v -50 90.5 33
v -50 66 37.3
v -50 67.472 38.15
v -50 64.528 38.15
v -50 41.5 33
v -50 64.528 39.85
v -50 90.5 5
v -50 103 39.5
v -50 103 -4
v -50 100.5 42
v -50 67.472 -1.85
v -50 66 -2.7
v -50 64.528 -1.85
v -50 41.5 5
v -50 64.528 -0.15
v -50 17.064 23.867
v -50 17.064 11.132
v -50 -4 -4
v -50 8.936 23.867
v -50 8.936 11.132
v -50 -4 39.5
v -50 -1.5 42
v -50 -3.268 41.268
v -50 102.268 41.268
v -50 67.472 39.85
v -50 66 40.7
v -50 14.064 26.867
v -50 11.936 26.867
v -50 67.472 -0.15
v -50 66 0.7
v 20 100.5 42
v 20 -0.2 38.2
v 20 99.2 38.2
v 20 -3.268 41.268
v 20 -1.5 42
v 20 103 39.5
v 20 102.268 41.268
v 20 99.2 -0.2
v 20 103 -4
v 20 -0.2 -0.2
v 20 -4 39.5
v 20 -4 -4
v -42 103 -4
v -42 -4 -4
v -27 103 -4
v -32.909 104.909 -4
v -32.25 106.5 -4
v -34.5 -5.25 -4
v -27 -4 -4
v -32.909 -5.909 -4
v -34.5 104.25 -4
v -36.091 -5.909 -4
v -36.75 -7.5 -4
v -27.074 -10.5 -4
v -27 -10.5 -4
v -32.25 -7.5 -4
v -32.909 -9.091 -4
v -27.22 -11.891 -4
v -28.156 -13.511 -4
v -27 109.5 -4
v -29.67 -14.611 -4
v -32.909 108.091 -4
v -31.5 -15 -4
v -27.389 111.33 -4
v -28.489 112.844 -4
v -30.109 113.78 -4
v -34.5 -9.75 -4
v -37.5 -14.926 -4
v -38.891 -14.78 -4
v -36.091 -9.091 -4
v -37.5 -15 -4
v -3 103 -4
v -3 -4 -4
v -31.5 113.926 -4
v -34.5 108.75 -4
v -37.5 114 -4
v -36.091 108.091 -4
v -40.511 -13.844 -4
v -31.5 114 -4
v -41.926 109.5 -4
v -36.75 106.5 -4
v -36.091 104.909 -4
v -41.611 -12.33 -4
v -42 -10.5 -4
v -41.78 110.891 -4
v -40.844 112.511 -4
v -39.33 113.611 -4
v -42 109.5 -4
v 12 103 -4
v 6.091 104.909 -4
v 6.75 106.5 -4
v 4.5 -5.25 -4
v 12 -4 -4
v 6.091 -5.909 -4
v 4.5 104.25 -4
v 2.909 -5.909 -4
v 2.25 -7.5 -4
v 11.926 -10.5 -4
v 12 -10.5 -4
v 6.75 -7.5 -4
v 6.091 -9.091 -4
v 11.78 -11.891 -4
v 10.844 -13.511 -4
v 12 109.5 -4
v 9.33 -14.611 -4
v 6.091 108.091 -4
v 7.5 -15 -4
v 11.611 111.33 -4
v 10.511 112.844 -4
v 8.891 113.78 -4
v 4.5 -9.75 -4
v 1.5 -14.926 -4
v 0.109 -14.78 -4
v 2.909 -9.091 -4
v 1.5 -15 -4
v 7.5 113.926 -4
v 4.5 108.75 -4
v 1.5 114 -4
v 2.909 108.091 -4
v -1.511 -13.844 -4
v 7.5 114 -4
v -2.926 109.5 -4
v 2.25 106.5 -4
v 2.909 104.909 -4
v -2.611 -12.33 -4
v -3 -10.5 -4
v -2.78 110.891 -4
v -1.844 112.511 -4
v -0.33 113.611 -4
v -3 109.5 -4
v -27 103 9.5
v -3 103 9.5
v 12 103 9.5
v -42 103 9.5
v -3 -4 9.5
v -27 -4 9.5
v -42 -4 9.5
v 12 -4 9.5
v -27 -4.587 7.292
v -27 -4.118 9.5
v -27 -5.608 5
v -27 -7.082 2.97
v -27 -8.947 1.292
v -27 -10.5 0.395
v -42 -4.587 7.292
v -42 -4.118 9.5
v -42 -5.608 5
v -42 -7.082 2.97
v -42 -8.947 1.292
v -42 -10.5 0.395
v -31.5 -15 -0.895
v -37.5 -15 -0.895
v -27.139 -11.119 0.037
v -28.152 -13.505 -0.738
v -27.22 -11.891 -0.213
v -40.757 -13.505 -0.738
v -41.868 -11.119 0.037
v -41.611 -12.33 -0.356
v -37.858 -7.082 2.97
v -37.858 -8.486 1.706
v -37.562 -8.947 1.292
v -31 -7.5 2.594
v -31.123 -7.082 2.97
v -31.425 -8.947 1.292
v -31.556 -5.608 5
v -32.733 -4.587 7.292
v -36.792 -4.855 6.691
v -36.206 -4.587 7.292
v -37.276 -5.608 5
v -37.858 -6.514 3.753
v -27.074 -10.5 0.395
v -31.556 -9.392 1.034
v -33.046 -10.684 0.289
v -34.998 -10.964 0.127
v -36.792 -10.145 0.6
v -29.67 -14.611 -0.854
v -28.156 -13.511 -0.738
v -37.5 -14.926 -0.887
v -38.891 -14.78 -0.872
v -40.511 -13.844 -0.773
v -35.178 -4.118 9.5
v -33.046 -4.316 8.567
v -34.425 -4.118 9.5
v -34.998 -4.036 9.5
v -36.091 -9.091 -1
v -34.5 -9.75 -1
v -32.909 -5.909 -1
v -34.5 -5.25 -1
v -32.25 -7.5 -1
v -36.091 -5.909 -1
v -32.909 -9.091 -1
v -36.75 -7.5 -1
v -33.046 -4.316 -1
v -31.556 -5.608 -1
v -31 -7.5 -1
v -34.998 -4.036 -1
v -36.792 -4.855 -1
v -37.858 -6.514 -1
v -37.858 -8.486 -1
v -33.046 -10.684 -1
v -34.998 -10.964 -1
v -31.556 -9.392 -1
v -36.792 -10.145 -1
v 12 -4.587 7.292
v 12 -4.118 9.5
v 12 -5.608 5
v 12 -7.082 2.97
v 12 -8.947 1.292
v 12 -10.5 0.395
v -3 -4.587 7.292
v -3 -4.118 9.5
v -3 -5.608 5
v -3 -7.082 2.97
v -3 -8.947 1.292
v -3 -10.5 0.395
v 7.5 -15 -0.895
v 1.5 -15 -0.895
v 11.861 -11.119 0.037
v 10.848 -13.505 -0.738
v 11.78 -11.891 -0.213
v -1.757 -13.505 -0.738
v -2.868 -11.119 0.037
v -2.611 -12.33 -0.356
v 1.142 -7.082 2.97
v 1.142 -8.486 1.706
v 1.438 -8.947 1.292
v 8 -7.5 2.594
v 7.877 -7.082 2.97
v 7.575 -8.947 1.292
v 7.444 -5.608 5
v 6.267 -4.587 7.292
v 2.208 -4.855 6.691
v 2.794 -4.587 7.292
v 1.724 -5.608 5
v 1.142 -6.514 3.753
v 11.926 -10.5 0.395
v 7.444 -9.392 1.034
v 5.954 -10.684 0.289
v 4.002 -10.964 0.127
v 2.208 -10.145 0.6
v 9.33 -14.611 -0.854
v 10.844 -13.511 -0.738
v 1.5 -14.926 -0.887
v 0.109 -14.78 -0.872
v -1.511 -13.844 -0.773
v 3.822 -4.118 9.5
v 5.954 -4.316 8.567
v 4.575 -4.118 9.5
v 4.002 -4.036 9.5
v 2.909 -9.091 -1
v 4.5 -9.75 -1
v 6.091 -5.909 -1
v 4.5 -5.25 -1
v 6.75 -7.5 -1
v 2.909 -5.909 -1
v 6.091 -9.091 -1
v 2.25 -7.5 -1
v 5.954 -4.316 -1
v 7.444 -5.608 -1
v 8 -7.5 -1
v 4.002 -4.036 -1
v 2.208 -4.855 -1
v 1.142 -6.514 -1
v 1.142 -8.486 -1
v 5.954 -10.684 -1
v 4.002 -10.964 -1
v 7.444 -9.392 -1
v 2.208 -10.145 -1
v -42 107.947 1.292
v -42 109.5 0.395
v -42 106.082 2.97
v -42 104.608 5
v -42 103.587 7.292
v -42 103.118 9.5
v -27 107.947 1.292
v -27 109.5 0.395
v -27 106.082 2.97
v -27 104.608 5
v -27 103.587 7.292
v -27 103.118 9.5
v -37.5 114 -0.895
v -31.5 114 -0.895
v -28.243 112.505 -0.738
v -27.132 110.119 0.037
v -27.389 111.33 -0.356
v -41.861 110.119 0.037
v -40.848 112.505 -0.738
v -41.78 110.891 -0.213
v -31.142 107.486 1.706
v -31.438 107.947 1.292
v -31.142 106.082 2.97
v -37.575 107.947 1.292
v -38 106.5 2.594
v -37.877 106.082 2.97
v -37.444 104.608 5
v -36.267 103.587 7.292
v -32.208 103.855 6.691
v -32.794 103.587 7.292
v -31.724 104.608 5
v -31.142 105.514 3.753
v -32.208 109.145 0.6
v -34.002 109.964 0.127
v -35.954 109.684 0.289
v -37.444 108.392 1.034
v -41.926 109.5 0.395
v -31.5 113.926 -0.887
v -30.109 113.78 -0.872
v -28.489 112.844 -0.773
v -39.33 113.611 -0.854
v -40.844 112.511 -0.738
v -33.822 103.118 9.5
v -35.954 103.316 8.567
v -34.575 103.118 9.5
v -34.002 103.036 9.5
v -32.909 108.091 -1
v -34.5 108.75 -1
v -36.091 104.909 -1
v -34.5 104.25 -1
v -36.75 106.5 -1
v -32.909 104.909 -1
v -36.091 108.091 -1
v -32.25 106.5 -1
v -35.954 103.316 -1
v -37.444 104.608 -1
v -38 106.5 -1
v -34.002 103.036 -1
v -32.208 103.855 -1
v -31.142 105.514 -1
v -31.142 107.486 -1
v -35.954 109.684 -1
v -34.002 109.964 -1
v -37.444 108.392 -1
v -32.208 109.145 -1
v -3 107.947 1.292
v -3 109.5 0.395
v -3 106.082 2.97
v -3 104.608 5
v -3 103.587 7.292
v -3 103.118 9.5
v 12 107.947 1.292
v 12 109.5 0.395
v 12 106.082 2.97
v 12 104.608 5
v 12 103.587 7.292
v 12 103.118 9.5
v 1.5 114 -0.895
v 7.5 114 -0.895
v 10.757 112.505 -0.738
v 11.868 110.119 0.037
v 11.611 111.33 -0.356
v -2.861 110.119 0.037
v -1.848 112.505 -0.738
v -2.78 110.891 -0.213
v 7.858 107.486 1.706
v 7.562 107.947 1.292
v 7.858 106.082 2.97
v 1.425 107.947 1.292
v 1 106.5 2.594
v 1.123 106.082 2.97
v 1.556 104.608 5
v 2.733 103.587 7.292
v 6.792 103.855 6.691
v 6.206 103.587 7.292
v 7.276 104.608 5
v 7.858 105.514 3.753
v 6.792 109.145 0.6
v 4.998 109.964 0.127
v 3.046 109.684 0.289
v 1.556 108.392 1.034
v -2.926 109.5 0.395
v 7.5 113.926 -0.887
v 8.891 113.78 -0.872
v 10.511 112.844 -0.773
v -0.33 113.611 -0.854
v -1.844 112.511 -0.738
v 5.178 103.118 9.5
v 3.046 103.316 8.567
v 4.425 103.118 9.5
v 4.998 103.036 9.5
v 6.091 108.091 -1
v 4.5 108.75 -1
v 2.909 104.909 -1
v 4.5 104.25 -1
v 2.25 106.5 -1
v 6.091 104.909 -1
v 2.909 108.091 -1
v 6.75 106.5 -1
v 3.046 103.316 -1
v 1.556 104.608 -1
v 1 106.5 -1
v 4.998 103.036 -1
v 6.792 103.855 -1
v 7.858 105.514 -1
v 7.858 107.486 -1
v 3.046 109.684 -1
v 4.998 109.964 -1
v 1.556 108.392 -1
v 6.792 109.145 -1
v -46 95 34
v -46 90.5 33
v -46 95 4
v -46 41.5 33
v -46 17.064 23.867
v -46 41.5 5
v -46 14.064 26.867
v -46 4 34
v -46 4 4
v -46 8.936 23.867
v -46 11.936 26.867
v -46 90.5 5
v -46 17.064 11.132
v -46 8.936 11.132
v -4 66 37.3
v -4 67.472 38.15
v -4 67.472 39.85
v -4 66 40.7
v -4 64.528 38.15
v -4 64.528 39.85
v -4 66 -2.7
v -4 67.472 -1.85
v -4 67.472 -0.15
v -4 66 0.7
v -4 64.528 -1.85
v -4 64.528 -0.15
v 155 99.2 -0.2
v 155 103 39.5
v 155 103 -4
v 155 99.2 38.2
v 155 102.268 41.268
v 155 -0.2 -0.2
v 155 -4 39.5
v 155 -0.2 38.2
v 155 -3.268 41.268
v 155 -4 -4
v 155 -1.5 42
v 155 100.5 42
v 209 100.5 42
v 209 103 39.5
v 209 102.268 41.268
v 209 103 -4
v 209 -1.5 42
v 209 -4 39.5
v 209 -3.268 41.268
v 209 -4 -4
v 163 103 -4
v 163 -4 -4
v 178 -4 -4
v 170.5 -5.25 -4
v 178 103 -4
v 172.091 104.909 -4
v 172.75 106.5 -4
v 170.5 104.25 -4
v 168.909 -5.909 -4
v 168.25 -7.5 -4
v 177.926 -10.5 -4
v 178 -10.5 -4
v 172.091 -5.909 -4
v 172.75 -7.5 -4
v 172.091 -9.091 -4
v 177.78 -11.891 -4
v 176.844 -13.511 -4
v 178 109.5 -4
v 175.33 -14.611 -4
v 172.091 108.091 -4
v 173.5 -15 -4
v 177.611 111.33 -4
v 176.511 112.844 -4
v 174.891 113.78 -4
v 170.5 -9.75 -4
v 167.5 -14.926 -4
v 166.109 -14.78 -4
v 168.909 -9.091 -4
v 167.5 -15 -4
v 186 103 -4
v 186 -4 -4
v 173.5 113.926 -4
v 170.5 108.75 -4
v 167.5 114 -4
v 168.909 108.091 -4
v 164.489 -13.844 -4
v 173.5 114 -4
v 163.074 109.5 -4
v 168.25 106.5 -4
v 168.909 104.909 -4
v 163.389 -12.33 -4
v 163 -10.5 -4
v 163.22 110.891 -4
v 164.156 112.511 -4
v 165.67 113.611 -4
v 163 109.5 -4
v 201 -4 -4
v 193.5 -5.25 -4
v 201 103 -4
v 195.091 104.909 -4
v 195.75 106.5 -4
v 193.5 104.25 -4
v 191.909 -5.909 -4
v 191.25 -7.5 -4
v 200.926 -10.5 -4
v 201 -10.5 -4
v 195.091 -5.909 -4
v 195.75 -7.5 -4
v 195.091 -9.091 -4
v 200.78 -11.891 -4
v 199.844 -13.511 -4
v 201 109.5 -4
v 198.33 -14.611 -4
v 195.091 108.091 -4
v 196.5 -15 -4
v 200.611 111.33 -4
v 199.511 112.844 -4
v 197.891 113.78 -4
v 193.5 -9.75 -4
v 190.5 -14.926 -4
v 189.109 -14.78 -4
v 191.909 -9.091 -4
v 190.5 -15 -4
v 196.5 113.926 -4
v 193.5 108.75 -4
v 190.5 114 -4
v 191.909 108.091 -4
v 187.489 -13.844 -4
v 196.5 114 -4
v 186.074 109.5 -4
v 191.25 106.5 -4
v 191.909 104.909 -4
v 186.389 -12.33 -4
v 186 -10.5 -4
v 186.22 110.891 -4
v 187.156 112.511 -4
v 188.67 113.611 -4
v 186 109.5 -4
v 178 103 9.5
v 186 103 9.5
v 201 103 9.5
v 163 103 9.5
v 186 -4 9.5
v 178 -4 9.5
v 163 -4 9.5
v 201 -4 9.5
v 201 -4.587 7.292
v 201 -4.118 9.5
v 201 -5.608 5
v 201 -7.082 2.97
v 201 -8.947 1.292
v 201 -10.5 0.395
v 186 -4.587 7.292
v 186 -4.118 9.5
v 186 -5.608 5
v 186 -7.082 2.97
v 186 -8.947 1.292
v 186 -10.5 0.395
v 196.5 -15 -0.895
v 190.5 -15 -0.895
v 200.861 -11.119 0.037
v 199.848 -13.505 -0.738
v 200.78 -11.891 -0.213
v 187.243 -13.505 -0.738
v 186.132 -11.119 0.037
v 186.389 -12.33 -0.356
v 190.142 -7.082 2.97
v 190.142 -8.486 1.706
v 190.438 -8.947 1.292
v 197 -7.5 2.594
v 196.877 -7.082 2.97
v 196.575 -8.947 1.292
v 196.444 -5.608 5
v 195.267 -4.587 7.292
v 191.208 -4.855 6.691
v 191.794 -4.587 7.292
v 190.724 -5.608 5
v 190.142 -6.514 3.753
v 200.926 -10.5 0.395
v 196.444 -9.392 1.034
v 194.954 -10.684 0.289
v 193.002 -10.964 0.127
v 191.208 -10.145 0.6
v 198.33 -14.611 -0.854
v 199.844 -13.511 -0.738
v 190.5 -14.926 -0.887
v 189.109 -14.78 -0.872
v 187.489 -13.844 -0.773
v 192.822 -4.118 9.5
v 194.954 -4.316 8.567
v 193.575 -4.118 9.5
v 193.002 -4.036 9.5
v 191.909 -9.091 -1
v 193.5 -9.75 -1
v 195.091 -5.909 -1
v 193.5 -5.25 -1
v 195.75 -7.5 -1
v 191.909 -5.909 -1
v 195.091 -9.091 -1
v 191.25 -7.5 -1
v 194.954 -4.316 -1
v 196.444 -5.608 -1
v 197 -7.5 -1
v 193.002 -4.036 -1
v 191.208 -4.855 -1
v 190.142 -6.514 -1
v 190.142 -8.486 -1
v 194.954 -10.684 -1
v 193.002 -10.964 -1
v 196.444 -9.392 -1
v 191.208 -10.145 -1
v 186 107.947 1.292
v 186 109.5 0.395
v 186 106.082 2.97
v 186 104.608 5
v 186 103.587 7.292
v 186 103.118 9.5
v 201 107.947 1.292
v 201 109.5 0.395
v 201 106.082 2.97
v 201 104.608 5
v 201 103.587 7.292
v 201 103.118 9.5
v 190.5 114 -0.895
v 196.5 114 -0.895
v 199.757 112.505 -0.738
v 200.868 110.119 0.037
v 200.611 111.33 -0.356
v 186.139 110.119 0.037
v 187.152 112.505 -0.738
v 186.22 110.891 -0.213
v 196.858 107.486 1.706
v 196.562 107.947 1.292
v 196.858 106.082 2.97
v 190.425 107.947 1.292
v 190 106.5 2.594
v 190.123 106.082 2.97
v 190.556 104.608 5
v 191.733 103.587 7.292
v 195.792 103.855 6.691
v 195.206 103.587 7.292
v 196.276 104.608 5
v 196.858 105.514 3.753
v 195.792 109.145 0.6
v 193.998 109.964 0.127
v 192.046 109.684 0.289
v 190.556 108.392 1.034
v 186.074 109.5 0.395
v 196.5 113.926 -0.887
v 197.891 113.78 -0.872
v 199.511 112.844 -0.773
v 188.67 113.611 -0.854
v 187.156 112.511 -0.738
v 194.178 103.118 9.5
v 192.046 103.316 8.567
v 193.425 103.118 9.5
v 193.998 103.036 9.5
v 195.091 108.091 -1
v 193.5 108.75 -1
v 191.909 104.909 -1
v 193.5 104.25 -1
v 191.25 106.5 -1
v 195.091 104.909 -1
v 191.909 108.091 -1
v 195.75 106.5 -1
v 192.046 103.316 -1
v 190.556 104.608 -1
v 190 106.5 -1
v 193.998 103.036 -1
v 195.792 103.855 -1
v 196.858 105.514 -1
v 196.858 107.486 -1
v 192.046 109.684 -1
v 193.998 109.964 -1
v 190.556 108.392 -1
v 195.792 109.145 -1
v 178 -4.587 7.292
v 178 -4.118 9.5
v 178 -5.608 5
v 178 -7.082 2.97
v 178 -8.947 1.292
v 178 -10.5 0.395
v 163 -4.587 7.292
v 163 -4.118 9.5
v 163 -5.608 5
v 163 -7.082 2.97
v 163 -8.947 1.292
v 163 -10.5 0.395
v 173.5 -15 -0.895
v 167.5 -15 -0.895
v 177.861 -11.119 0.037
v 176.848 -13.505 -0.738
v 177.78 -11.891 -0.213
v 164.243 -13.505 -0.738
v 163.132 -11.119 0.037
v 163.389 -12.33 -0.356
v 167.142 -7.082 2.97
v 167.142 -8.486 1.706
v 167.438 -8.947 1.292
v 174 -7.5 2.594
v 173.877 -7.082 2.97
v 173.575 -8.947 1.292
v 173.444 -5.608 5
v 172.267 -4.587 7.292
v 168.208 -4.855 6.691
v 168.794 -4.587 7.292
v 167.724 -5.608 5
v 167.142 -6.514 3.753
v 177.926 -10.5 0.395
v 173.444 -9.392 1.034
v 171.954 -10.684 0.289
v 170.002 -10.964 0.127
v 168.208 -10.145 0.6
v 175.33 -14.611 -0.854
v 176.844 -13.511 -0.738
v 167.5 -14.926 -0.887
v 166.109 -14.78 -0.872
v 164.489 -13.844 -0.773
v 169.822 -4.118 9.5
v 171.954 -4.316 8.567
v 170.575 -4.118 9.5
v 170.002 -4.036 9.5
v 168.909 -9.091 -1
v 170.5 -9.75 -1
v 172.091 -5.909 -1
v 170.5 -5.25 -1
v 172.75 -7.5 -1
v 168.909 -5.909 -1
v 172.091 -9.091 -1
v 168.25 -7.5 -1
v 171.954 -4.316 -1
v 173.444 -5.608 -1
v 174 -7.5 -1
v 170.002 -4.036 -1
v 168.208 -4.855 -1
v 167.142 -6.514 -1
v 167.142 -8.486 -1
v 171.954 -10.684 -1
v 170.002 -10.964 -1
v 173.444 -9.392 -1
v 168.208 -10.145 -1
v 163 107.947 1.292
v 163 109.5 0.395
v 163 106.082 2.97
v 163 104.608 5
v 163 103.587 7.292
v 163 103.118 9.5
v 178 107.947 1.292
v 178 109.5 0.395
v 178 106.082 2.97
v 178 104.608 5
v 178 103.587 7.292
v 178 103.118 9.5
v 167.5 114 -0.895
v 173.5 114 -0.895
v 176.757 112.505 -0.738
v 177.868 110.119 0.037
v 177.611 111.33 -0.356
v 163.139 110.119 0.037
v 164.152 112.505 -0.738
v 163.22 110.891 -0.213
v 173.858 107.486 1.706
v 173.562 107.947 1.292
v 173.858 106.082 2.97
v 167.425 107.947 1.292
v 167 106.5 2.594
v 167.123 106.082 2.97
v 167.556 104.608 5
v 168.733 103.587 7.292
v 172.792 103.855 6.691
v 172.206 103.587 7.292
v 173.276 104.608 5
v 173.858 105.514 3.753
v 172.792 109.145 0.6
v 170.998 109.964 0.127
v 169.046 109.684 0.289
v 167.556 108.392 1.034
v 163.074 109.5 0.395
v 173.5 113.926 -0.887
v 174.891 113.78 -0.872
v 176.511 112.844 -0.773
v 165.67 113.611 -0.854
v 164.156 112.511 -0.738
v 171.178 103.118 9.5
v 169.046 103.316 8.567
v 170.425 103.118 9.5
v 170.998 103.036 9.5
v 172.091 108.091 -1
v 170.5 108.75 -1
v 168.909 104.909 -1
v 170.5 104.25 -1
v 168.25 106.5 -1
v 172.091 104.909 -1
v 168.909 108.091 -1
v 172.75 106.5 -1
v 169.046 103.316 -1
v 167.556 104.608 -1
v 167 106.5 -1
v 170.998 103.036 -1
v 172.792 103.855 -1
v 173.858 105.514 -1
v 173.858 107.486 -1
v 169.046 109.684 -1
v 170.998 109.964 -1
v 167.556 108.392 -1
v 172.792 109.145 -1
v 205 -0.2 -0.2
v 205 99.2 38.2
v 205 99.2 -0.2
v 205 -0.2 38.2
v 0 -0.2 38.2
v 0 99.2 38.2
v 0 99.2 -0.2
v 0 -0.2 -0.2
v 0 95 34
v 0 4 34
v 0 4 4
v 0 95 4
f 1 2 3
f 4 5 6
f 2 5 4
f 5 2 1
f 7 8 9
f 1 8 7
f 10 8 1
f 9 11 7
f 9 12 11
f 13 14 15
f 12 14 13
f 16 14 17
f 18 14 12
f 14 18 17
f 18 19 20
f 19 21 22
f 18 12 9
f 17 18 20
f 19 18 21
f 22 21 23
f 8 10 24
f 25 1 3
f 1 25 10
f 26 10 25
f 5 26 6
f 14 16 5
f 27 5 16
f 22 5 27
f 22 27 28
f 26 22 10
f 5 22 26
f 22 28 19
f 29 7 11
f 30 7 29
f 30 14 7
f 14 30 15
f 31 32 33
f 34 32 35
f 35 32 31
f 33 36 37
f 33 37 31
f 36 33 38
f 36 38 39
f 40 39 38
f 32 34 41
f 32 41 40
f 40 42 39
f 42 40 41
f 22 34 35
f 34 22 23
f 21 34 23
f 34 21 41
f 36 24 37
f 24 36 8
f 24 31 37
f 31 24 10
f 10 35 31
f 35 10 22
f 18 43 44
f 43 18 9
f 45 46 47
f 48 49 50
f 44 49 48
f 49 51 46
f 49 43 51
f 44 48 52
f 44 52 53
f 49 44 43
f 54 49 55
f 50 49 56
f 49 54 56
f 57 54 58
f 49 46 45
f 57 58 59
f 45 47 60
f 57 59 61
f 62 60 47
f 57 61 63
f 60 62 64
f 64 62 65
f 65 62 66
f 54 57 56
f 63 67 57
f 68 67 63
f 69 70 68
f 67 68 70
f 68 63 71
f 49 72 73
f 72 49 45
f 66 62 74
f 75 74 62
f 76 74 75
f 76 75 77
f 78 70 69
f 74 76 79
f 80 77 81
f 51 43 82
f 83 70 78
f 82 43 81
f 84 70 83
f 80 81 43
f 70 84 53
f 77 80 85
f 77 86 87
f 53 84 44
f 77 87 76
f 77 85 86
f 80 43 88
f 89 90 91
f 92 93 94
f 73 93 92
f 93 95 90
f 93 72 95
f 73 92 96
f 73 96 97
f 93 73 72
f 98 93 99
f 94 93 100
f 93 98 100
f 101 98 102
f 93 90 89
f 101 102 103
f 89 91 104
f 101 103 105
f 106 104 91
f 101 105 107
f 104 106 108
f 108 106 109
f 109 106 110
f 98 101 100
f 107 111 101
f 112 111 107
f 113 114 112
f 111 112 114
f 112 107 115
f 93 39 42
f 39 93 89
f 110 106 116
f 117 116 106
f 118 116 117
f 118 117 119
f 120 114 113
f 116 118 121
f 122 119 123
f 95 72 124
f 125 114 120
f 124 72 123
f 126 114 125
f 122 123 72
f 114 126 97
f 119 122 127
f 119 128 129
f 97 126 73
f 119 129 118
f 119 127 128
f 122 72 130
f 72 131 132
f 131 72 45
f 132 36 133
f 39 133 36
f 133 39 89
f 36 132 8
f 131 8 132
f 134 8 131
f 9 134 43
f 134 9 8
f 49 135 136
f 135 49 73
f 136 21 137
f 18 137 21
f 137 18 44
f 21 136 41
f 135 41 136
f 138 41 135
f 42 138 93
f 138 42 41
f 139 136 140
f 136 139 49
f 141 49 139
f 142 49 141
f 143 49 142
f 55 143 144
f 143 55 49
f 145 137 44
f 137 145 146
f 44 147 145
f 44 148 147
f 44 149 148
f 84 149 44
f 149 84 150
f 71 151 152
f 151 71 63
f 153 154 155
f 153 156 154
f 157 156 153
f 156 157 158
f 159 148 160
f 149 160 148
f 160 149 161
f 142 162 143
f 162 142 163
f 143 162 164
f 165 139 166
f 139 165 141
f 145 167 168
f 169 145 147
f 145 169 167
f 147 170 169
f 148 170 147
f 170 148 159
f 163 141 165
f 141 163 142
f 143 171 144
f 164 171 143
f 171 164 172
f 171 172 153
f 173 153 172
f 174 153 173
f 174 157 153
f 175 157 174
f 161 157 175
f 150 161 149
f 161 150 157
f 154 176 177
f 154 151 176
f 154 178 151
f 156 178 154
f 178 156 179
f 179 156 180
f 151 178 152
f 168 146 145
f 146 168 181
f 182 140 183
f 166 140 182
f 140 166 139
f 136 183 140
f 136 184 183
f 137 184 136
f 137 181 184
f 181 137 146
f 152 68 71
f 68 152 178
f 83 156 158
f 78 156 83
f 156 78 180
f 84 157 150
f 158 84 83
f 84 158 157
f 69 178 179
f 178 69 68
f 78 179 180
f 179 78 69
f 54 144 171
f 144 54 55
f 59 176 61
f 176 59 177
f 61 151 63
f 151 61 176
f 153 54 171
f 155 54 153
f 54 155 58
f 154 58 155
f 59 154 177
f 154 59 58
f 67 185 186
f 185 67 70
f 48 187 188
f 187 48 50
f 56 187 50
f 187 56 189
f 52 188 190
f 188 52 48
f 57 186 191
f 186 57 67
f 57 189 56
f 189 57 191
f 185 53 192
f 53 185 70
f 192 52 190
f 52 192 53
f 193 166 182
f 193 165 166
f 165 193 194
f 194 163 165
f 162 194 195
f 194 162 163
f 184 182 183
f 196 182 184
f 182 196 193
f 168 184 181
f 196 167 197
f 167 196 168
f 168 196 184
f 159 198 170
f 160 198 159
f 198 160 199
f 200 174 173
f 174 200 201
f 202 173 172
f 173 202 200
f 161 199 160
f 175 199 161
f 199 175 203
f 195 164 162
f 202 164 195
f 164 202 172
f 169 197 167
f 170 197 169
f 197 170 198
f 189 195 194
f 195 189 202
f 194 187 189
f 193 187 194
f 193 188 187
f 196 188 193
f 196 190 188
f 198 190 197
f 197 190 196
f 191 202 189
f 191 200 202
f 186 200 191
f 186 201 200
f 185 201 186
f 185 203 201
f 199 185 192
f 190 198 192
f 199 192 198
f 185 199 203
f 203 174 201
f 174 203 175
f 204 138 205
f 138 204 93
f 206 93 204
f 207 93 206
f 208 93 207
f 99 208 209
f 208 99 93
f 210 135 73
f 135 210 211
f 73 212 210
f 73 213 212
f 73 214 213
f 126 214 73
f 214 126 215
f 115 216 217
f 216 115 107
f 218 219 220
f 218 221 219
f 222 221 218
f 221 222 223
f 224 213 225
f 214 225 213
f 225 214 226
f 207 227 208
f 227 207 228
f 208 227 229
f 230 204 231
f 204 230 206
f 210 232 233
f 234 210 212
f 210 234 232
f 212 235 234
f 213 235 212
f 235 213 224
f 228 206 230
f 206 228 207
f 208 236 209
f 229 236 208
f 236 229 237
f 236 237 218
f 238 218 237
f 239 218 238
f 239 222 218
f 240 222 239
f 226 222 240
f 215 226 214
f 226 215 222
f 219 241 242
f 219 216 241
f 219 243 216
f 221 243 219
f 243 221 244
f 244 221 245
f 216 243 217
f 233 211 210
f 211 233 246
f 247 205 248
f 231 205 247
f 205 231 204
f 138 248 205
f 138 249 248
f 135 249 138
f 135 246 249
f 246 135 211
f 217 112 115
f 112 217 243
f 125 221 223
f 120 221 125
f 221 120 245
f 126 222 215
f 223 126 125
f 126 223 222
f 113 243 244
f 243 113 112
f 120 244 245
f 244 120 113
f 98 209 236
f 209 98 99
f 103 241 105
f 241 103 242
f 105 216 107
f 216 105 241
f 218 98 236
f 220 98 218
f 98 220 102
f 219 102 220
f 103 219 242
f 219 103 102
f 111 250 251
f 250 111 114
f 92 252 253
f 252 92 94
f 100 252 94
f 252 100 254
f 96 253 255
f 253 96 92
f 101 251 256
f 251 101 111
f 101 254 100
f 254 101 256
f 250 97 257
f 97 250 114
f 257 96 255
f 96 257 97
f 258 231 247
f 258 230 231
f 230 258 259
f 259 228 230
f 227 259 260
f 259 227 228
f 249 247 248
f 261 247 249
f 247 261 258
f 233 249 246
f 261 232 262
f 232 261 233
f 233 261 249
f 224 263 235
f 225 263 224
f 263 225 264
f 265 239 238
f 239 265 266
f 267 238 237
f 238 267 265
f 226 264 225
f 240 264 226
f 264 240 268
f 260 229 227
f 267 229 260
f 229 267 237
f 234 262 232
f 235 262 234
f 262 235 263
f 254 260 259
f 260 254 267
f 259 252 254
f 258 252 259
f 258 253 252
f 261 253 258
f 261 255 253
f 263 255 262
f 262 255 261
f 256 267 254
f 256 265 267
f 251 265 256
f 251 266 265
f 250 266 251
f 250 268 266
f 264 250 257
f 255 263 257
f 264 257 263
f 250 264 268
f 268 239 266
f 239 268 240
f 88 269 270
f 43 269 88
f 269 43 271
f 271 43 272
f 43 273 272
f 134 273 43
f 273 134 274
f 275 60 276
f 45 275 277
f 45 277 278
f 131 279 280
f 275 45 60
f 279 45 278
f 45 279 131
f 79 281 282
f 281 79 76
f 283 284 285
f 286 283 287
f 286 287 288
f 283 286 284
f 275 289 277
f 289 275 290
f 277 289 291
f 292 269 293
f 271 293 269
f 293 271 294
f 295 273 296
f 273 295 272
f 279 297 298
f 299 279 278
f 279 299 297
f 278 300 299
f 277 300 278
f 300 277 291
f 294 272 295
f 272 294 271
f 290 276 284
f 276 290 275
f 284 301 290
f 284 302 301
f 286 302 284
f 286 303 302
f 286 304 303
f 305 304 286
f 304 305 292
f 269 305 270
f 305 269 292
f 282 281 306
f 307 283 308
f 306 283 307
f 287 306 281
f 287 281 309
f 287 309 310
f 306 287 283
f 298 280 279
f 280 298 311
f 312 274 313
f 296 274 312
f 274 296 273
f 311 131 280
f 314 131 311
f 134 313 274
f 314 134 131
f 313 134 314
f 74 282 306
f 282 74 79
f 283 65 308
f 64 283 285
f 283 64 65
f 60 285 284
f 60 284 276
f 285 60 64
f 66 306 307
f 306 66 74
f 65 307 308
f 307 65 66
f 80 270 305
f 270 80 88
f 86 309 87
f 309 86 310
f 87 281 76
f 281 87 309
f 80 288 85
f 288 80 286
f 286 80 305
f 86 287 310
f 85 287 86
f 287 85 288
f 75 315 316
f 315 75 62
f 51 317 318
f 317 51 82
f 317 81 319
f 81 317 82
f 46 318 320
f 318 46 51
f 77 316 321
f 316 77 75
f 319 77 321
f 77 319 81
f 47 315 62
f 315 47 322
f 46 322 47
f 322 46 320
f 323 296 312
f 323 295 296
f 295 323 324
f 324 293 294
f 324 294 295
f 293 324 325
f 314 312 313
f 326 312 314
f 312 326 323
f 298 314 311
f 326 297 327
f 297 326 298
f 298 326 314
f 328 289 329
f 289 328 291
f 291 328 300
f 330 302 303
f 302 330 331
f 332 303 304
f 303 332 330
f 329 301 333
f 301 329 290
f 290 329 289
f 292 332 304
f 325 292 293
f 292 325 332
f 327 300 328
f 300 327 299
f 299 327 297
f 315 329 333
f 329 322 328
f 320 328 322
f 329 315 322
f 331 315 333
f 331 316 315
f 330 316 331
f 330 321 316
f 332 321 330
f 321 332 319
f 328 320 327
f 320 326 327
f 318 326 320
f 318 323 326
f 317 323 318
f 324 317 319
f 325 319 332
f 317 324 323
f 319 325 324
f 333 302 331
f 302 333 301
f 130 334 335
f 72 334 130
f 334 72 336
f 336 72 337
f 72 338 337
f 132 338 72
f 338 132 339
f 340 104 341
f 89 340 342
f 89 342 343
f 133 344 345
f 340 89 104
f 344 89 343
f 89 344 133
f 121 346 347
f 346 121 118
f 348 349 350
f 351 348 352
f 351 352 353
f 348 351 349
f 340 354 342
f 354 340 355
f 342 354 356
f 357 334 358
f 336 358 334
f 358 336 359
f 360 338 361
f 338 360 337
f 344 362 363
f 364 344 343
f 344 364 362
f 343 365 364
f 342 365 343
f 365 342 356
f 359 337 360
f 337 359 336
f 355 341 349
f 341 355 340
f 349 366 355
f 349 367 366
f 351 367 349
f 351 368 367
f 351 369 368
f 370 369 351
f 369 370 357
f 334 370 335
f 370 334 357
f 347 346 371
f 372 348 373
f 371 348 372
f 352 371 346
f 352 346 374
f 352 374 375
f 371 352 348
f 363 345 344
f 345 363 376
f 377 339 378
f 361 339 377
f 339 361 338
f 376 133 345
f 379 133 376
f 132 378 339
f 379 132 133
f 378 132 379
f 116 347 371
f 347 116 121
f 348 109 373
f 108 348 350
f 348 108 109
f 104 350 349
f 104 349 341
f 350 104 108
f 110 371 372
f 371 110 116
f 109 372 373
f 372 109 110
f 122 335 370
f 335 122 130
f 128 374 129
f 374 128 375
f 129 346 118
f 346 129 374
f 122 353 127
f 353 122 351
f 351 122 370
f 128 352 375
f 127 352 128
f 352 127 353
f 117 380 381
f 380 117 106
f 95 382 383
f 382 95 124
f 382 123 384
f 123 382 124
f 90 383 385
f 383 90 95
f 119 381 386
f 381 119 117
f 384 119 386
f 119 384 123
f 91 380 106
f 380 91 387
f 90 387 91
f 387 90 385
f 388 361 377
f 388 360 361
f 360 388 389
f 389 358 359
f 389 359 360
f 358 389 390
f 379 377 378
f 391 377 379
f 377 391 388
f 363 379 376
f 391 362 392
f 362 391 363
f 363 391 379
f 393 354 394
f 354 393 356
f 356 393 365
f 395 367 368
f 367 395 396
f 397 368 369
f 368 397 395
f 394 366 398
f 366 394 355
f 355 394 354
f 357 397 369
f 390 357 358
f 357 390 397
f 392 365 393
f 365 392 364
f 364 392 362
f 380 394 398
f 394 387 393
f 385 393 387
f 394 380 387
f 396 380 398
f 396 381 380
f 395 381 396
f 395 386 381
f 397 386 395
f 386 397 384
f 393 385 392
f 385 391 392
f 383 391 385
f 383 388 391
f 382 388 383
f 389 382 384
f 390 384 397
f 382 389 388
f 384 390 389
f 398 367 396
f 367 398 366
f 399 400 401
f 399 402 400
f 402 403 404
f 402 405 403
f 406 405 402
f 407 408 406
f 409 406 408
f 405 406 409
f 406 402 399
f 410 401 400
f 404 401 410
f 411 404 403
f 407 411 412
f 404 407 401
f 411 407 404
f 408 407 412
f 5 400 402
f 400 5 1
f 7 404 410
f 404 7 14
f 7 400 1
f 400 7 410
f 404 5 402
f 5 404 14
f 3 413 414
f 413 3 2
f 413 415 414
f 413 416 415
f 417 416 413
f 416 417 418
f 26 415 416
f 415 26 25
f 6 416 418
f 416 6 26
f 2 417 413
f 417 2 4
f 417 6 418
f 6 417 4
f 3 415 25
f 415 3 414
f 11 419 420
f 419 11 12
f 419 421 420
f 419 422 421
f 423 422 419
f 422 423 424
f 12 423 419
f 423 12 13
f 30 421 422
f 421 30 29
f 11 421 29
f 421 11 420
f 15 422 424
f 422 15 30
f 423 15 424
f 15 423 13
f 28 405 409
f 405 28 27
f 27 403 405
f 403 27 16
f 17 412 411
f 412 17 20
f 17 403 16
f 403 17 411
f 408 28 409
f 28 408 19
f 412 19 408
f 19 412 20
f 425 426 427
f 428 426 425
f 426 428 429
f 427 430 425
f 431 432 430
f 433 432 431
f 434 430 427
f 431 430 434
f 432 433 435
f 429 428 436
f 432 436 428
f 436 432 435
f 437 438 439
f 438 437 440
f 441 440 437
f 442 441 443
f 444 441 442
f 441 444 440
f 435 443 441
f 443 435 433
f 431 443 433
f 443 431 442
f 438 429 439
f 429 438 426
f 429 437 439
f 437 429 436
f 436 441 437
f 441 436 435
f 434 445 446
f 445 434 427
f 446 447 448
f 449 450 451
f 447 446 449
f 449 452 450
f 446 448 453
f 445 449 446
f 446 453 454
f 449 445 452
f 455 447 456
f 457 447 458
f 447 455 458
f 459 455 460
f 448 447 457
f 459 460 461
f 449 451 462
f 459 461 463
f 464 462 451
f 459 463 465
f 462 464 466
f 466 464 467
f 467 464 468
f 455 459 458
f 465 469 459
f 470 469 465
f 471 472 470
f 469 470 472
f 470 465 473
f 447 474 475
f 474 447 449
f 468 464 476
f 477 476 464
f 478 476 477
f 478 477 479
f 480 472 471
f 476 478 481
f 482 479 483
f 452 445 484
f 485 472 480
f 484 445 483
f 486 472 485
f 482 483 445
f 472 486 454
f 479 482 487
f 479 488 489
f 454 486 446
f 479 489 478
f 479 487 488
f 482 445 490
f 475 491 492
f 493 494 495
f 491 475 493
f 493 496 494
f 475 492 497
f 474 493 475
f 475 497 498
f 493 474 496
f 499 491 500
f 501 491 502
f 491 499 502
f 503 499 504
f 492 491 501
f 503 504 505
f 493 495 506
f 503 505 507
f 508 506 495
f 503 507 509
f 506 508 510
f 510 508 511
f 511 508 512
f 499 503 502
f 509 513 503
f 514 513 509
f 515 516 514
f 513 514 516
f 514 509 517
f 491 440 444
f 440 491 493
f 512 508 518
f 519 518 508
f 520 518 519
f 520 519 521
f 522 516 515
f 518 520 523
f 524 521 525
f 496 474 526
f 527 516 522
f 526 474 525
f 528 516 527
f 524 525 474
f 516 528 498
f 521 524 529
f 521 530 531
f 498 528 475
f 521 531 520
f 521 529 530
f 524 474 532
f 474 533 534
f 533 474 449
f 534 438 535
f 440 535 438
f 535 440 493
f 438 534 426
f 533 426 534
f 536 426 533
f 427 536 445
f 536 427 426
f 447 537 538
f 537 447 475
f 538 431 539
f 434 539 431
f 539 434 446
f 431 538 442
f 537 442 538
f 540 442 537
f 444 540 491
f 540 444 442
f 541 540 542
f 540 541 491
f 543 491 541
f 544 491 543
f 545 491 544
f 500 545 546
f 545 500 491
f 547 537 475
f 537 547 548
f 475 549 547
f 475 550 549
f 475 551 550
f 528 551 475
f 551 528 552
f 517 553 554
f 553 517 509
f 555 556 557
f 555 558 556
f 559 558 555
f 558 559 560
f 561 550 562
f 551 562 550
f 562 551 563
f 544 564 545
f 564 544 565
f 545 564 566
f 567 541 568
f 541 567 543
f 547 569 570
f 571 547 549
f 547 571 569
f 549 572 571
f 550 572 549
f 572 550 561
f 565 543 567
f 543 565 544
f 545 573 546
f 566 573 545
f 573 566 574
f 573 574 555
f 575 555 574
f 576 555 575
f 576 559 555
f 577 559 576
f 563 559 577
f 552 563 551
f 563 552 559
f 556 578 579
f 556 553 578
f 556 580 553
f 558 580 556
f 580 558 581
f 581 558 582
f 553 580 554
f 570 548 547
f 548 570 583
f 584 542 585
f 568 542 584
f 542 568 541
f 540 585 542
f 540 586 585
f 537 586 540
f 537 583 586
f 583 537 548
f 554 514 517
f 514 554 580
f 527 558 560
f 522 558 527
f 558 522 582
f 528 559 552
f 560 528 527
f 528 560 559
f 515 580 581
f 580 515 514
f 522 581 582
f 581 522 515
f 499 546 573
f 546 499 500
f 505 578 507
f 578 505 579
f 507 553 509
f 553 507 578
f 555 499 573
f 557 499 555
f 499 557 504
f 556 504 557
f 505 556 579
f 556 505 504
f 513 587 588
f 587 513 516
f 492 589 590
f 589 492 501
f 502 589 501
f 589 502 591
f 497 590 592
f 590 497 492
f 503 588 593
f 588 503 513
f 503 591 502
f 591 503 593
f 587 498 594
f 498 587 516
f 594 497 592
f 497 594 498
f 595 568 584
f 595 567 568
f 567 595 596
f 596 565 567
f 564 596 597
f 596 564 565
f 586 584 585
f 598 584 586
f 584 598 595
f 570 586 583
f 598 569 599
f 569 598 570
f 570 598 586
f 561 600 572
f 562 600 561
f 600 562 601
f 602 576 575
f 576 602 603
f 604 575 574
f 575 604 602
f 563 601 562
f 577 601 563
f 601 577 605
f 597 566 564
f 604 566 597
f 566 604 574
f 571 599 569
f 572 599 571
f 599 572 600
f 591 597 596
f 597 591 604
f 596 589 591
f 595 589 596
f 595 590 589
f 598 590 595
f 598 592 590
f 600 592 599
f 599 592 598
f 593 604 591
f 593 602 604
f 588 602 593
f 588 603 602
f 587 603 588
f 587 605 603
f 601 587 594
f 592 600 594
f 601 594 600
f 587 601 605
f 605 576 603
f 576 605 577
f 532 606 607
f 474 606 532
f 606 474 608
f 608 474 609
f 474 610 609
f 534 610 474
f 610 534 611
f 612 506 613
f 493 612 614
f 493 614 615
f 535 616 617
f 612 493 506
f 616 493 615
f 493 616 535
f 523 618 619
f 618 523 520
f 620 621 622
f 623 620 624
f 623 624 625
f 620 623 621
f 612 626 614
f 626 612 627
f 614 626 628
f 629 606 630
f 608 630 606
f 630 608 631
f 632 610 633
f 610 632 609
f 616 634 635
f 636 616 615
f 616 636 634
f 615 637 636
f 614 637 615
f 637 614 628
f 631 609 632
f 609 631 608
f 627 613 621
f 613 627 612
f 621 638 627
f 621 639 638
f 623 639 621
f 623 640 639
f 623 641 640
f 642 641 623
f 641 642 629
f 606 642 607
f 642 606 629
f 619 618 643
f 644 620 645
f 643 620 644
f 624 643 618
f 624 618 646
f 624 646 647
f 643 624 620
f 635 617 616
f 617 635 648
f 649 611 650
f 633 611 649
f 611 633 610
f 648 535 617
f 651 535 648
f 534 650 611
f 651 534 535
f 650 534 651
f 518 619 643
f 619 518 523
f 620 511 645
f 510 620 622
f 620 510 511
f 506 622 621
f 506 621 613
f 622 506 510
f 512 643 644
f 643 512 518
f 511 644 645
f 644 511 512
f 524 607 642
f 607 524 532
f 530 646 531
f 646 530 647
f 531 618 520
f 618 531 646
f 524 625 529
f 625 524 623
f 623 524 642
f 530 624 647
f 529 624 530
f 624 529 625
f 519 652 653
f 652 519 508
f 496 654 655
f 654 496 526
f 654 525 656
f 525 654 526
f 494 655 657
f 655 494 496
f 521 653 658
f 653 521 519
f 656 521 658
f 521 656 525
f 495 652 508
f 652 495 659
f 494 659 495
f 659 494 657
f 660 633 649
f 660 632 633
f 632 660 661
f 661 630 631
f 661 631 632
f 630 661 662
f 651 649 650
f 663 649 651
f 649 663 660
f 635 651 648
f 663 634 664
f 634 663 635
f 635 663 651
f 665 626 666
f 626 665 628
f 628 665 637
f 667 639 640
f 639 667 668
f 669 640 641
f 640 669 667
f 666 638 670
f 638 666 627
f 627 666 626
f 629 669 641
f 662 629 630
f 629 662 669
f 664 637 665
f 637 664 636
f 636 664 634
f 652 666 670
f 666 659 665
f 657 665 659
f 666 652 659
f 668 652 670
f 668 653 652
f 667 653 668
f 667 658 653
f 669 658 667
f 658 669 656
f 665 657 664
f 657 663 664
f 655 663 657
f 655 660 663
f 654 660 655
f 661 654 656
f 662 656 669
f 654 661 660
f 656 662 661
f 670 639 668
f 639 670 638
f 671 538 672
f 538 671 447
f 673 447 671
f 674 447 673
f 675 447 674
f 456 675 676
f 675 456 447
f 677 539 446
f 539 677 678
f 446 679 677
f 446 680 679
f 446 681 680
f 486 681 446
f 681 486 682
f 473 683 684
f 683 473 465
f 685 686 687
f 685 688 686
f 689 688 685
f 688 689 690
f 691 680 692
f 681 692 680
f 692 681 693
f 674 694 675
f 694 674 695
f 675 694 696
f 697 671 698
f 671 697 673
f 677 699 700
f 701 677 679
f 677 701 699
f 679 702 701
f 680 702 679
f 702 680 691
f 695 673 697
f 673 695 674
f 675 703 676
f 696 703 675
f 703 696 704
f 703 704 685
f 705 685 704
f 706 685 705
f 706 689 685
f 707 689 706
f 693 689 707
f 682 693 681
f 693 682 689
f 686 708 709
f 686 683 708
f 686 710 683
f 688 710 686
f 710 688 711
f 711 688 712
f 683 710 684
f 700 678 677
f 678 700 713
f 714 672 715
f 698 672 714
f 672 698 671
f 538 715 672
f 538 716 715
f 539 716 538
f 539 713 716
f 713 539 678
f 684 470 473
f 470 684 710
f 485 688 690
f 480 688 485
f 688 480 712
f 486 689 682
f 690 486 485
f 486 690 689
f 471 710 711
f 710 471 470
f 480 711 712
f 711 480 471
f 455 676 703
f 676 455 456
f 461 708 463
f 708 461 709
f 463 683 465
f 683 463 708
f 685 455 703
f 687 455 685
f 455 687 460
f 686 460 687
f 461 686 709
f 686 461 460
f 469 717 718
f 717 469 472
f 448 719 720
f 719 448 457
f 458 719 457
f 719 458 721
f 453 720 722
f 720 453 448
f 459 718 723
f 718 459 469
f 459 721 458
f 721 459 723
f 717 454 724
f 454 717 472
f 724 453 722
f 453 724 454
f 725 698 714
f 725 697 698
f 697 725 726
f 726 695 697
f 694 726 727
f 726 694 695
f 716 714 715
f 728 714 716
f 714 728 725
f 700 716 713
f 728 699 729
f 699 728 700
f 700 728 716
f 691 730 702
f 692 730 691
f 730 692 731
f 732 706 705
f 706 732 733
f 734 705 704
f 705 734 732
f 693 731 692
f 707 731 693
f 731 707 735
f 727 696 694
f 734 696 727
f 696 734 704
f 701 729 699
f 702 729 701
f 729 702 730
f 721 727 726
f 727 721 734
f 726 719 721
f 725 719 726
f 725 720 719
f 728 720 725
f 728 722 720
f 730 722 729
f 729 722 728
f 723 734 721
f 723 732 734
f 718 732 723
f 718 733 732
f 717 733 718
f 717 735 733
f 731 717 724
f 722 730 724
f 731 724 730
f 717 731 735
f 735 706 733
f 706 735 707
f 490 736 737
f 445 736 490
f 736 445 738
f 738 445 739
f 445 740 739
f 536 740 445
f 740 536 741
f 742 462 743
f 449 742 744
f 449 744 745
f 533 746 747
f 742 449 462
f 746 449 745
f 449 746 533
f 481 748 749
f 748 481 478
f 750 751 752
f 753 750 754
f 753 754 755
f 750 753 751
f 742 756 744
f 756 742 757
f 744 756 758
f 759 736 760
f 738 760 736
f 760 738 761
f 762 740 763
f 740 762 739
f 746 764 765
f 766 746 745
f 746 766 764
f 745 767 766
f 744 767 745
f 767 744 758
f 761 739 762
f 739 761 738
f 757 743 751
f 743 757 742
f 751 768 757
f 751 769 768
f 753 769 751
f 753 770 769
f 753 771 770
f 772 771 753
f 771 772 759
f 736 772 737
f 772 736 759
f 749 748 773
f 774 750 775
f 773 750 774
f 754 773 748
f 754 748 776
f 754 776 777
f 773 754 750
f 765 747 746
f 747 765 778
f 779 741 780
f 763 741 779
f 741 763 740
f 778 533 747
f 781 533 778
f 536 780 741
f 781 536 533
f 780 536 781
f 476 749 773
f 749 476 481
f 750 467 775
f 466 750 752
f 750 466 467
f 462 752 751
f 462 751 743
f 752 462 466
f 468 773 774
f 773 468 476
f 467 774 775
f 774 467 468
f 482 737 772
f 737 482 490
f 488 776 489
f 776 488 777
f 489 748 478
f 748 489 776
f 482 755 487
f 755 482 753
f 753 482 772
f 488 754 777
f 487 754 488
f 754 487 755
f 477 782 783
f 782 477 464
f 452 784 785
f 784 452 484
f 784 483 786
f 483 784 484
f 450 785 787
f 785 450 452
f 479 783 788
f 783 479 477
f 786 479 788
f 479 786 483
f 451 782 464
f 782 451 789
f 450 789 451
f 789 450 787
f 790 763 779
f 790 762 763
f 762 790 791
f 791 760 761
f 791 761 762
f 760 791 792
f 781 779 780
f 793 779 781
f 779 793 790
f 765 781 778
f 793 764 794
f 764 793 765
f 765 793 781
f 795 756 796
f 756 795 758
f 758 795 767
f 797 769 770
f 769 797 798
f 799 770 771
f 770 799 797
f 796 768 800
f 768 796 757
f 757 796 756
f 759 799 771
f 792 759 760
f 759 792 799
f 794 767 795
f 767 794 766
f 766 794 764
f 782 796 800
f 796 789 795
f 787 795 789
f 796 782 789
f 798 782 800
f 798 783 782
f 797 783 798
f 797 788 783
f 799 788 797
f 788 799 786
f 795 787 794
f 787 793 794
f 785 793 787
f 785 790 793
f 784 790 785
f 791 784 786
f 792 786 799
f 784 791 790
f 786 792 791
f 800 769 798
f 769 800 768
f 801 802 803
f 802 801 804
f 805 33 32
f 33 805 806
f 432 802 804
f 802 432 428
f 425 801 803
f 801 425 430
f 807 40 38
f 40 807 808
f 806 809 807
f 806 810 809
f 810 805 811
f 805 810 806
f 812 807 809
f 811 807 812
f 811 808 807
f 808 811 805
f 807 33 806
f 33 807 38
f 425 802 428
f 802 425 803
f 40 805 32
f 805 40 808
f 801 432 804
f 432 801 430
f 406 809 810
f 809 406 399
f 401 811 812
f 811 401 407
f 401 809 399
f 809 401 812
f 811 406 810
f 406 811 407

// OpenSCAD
// file: ../simple_rounded_cube.scad
module sr_cube(size=[1,1,1],radius=0.5,corners=[1,1,1,1]) {
    difference(){    
    cube(size);
    
        if(corners[0])
        translate([radius,radius,0])rotate([0,0,180])difference(){
                cube([radius*2,radius*2,size[2]]);
                cylinder(size[2],radius,radius);
        }
        if(corners[1])
        translate([size[0]-radius,radius,0])rotate([0,0,270])difference(){
                cube([radius*2,radius*2,size[2]]);
                cylinder(size[2],radius,radius);
        }
        if(corners[2])
        translate([size[0]-radius,size[1]-radius,0])rotate([0,0,0])difference(){
                cube([radius*2,radius*2,size[2]]);
                cylinder(size[2],radius,radius);
        }
        if(corners[3])
        translate([radius,size[1]-radius,0])rotate([0,0,90])difference(){
                cube([radius*2,radius*2,size[2]]);
                cylinder(size[2],radius,radius);
        }
        }
        
}


//sr_cube([20,20,5], radius=4,corners=[0,0,0,0]);
// main file
include <../simple_rounded_cube.scad>

print_back = true;
print_front = true;

psu_l = 205;
psu_w = 99;
psu_h = 38;

eps = 0.2;
s = 4;


l_back = 50;
l_front = 20;
l_front_addition = 50;
l_front_total = l_front + l_front_addition;

edge_dia = 5;


feet_l = 15;
feet_w = 15;
feet_h = psu_h;
feet_s = 3;
feet_r = min(feet_l,feet_h) - feet_s;
feet_screw_dia = 4.5;
feet_screw_outer_dia = 7;
feet_edge_dia = feet_l-2*feet_s;

feet_margin = 2*s + feet_w/2;
front_feet_distance = l_front_total - 2*feet_margin;

back_feet_distance = l_back + s - 2*feet_margin;


c13_h = 28;
c13_w = 49;
c13_hole_distance = 40;
c13_hole_r = 3/2 + eps; 
c13_y = psu_w/3*2;
c13_z = psu_h/2;


xt60_h = 15.735;
xt60_w = 8.128;
xt60_e = 3;
xt60_x = psu_w/3-20;
xt60_z = psu_h/2;

module feet() {
        translate([-feet_l/2, -feet_w/2,0]) {
            difference(){
                intersection(){
                union(){
            cube([feet_l, feet_w, feet_s]);
            translate([0,feet_w-feet_s,0]) cube([feet_l,s,feet_h]);
            translate([0,0,feet_s]) difference() {
                cube([feet_l,feet_w-s,feet_h-s]); 
                translate([feet_l,feet_w-feet_r-s,feet_r]) rotate([0,-90,0]) cylinder(feet_l,feet_r,feet_r); 
                cube([feet_l,feet_w-feet_r-feet_s,feet_h]); 
                translate([0,0,feet_edge_dia/2 + feet_s*2]) cube([feet_l,feet_w,feet_h]);
                }
        }
    sr_cube([feet_l,feet_w,10000], radius = feet_edge_dia/2, corners=[1,1,0,0]);
        }
        
        
            translate([feet_l/2,feet_w/2,0]) cylinder(1000,feet_screw_dia/2, feet_screw_dia/2);
            translate([feet_l/2,feet_w/2,feet_s]) cylinder(1000,feet_screw_outer_dia/2, feet_screw_outer_dia/2);

            }
            }

    }


// cupe representing power supply unit
//cube([psu_l,psu_w,psu_h]);

difference(){

    union(){
        if(print_front) {
            difference() {
                union(){
                    translate([l_front,-s,-s]) rotate([0,-90,0]) sr_cube([psu_h+2*s, psu_w+2*s, l_front_total], radius=edge_dia/2, corners=[0,1,1,0]);
                    
                    //feets//
                    translate([-l_front_addition+feet_margin,-feet_w/2,-s]) feet();
                    translate([-l_front_addition+feet_margin+front_feet_distance,-feet_w/2,-s]) feet();

                    translate([-l_front_addition+feet_margin,psu_w+feet_w/2,-s]) rotate([0,0,180])feet();
                    translate([-l_front_addition+feet_margin+front_feet_distance,psu_w+feet_w/2,-s]) rotate([0,0,180])feet();
                }

            //c13 power input (get dimensions from plug thing with switch and fuse
            translate([-l_front_addition,c13_y-c13_w/2,c13_z-c13_h/2]) {
                cube([s,c13_w,c13_h]);
            }
            translate([-l_front_addition,c13_y,c13_z+c13_hole_distance/2])  rotate([0,90,0]) cylinder(l_front_addition-s,c13_hole_r,c13_hole_r); 
            translate([-l_front_addition,c13_y,c13_z-c13_hole_distance/2])  rotate([0,90,0]) cylinder(l_front_addition-s,c13_hole_r,c13_hole_r); 
            
            
            
            //power output via drone plug
                    translate([-l_front_addition,xt60_x-xt60_w/2,xt60_z-xt60_h/2])
        
       rotate([90,0,0])rotate([0,90,0]) linear_extrude(s)  polygon([[0,0],[xt60_w,0],[xt60_w,xt60_h-xt60_e],[xt60_w-xt60_e,xt60_h],[xt60_e,xt60_h],[0,xt60_h-xt60_e]]);

            //todo: power output via 220v, attention: use safe plug or cable
        }

        }

        if(print_back) {
                translate([psu_l+s, -s, -s]) rotate([0,-90,0]) sr_cube([psu_h+2*s,psu_w+2*s,l_back+s], radius=edge_dia/2, corners=[0,1,1,0]);

                translate([psu_l+s-feet_margin,-feet_w/2,-s]) feet();
                translate([psu_l+s-feet_margin, psu_w+feet_w/2,-s]) rotate([0,0,180])feet();

                translate([psu_l+s-feet_margin-back_feet_distance,-feet_w/2,-s]) feet();
                translate([psu_l+s-feet_margin-back_feet_distance, psu_w+feet_w/2,-s]) rotate([0,0,180])feet();

        }
    }
    translate([0,-eps,-eps]) cube([psu_l,psu_w+2*eps,psu_h+2*eps]);
    translate([-l_front_addition+s,s,s]) cube([l_front_addition,psu_w-2*s,psu_h-2*s]);
}
